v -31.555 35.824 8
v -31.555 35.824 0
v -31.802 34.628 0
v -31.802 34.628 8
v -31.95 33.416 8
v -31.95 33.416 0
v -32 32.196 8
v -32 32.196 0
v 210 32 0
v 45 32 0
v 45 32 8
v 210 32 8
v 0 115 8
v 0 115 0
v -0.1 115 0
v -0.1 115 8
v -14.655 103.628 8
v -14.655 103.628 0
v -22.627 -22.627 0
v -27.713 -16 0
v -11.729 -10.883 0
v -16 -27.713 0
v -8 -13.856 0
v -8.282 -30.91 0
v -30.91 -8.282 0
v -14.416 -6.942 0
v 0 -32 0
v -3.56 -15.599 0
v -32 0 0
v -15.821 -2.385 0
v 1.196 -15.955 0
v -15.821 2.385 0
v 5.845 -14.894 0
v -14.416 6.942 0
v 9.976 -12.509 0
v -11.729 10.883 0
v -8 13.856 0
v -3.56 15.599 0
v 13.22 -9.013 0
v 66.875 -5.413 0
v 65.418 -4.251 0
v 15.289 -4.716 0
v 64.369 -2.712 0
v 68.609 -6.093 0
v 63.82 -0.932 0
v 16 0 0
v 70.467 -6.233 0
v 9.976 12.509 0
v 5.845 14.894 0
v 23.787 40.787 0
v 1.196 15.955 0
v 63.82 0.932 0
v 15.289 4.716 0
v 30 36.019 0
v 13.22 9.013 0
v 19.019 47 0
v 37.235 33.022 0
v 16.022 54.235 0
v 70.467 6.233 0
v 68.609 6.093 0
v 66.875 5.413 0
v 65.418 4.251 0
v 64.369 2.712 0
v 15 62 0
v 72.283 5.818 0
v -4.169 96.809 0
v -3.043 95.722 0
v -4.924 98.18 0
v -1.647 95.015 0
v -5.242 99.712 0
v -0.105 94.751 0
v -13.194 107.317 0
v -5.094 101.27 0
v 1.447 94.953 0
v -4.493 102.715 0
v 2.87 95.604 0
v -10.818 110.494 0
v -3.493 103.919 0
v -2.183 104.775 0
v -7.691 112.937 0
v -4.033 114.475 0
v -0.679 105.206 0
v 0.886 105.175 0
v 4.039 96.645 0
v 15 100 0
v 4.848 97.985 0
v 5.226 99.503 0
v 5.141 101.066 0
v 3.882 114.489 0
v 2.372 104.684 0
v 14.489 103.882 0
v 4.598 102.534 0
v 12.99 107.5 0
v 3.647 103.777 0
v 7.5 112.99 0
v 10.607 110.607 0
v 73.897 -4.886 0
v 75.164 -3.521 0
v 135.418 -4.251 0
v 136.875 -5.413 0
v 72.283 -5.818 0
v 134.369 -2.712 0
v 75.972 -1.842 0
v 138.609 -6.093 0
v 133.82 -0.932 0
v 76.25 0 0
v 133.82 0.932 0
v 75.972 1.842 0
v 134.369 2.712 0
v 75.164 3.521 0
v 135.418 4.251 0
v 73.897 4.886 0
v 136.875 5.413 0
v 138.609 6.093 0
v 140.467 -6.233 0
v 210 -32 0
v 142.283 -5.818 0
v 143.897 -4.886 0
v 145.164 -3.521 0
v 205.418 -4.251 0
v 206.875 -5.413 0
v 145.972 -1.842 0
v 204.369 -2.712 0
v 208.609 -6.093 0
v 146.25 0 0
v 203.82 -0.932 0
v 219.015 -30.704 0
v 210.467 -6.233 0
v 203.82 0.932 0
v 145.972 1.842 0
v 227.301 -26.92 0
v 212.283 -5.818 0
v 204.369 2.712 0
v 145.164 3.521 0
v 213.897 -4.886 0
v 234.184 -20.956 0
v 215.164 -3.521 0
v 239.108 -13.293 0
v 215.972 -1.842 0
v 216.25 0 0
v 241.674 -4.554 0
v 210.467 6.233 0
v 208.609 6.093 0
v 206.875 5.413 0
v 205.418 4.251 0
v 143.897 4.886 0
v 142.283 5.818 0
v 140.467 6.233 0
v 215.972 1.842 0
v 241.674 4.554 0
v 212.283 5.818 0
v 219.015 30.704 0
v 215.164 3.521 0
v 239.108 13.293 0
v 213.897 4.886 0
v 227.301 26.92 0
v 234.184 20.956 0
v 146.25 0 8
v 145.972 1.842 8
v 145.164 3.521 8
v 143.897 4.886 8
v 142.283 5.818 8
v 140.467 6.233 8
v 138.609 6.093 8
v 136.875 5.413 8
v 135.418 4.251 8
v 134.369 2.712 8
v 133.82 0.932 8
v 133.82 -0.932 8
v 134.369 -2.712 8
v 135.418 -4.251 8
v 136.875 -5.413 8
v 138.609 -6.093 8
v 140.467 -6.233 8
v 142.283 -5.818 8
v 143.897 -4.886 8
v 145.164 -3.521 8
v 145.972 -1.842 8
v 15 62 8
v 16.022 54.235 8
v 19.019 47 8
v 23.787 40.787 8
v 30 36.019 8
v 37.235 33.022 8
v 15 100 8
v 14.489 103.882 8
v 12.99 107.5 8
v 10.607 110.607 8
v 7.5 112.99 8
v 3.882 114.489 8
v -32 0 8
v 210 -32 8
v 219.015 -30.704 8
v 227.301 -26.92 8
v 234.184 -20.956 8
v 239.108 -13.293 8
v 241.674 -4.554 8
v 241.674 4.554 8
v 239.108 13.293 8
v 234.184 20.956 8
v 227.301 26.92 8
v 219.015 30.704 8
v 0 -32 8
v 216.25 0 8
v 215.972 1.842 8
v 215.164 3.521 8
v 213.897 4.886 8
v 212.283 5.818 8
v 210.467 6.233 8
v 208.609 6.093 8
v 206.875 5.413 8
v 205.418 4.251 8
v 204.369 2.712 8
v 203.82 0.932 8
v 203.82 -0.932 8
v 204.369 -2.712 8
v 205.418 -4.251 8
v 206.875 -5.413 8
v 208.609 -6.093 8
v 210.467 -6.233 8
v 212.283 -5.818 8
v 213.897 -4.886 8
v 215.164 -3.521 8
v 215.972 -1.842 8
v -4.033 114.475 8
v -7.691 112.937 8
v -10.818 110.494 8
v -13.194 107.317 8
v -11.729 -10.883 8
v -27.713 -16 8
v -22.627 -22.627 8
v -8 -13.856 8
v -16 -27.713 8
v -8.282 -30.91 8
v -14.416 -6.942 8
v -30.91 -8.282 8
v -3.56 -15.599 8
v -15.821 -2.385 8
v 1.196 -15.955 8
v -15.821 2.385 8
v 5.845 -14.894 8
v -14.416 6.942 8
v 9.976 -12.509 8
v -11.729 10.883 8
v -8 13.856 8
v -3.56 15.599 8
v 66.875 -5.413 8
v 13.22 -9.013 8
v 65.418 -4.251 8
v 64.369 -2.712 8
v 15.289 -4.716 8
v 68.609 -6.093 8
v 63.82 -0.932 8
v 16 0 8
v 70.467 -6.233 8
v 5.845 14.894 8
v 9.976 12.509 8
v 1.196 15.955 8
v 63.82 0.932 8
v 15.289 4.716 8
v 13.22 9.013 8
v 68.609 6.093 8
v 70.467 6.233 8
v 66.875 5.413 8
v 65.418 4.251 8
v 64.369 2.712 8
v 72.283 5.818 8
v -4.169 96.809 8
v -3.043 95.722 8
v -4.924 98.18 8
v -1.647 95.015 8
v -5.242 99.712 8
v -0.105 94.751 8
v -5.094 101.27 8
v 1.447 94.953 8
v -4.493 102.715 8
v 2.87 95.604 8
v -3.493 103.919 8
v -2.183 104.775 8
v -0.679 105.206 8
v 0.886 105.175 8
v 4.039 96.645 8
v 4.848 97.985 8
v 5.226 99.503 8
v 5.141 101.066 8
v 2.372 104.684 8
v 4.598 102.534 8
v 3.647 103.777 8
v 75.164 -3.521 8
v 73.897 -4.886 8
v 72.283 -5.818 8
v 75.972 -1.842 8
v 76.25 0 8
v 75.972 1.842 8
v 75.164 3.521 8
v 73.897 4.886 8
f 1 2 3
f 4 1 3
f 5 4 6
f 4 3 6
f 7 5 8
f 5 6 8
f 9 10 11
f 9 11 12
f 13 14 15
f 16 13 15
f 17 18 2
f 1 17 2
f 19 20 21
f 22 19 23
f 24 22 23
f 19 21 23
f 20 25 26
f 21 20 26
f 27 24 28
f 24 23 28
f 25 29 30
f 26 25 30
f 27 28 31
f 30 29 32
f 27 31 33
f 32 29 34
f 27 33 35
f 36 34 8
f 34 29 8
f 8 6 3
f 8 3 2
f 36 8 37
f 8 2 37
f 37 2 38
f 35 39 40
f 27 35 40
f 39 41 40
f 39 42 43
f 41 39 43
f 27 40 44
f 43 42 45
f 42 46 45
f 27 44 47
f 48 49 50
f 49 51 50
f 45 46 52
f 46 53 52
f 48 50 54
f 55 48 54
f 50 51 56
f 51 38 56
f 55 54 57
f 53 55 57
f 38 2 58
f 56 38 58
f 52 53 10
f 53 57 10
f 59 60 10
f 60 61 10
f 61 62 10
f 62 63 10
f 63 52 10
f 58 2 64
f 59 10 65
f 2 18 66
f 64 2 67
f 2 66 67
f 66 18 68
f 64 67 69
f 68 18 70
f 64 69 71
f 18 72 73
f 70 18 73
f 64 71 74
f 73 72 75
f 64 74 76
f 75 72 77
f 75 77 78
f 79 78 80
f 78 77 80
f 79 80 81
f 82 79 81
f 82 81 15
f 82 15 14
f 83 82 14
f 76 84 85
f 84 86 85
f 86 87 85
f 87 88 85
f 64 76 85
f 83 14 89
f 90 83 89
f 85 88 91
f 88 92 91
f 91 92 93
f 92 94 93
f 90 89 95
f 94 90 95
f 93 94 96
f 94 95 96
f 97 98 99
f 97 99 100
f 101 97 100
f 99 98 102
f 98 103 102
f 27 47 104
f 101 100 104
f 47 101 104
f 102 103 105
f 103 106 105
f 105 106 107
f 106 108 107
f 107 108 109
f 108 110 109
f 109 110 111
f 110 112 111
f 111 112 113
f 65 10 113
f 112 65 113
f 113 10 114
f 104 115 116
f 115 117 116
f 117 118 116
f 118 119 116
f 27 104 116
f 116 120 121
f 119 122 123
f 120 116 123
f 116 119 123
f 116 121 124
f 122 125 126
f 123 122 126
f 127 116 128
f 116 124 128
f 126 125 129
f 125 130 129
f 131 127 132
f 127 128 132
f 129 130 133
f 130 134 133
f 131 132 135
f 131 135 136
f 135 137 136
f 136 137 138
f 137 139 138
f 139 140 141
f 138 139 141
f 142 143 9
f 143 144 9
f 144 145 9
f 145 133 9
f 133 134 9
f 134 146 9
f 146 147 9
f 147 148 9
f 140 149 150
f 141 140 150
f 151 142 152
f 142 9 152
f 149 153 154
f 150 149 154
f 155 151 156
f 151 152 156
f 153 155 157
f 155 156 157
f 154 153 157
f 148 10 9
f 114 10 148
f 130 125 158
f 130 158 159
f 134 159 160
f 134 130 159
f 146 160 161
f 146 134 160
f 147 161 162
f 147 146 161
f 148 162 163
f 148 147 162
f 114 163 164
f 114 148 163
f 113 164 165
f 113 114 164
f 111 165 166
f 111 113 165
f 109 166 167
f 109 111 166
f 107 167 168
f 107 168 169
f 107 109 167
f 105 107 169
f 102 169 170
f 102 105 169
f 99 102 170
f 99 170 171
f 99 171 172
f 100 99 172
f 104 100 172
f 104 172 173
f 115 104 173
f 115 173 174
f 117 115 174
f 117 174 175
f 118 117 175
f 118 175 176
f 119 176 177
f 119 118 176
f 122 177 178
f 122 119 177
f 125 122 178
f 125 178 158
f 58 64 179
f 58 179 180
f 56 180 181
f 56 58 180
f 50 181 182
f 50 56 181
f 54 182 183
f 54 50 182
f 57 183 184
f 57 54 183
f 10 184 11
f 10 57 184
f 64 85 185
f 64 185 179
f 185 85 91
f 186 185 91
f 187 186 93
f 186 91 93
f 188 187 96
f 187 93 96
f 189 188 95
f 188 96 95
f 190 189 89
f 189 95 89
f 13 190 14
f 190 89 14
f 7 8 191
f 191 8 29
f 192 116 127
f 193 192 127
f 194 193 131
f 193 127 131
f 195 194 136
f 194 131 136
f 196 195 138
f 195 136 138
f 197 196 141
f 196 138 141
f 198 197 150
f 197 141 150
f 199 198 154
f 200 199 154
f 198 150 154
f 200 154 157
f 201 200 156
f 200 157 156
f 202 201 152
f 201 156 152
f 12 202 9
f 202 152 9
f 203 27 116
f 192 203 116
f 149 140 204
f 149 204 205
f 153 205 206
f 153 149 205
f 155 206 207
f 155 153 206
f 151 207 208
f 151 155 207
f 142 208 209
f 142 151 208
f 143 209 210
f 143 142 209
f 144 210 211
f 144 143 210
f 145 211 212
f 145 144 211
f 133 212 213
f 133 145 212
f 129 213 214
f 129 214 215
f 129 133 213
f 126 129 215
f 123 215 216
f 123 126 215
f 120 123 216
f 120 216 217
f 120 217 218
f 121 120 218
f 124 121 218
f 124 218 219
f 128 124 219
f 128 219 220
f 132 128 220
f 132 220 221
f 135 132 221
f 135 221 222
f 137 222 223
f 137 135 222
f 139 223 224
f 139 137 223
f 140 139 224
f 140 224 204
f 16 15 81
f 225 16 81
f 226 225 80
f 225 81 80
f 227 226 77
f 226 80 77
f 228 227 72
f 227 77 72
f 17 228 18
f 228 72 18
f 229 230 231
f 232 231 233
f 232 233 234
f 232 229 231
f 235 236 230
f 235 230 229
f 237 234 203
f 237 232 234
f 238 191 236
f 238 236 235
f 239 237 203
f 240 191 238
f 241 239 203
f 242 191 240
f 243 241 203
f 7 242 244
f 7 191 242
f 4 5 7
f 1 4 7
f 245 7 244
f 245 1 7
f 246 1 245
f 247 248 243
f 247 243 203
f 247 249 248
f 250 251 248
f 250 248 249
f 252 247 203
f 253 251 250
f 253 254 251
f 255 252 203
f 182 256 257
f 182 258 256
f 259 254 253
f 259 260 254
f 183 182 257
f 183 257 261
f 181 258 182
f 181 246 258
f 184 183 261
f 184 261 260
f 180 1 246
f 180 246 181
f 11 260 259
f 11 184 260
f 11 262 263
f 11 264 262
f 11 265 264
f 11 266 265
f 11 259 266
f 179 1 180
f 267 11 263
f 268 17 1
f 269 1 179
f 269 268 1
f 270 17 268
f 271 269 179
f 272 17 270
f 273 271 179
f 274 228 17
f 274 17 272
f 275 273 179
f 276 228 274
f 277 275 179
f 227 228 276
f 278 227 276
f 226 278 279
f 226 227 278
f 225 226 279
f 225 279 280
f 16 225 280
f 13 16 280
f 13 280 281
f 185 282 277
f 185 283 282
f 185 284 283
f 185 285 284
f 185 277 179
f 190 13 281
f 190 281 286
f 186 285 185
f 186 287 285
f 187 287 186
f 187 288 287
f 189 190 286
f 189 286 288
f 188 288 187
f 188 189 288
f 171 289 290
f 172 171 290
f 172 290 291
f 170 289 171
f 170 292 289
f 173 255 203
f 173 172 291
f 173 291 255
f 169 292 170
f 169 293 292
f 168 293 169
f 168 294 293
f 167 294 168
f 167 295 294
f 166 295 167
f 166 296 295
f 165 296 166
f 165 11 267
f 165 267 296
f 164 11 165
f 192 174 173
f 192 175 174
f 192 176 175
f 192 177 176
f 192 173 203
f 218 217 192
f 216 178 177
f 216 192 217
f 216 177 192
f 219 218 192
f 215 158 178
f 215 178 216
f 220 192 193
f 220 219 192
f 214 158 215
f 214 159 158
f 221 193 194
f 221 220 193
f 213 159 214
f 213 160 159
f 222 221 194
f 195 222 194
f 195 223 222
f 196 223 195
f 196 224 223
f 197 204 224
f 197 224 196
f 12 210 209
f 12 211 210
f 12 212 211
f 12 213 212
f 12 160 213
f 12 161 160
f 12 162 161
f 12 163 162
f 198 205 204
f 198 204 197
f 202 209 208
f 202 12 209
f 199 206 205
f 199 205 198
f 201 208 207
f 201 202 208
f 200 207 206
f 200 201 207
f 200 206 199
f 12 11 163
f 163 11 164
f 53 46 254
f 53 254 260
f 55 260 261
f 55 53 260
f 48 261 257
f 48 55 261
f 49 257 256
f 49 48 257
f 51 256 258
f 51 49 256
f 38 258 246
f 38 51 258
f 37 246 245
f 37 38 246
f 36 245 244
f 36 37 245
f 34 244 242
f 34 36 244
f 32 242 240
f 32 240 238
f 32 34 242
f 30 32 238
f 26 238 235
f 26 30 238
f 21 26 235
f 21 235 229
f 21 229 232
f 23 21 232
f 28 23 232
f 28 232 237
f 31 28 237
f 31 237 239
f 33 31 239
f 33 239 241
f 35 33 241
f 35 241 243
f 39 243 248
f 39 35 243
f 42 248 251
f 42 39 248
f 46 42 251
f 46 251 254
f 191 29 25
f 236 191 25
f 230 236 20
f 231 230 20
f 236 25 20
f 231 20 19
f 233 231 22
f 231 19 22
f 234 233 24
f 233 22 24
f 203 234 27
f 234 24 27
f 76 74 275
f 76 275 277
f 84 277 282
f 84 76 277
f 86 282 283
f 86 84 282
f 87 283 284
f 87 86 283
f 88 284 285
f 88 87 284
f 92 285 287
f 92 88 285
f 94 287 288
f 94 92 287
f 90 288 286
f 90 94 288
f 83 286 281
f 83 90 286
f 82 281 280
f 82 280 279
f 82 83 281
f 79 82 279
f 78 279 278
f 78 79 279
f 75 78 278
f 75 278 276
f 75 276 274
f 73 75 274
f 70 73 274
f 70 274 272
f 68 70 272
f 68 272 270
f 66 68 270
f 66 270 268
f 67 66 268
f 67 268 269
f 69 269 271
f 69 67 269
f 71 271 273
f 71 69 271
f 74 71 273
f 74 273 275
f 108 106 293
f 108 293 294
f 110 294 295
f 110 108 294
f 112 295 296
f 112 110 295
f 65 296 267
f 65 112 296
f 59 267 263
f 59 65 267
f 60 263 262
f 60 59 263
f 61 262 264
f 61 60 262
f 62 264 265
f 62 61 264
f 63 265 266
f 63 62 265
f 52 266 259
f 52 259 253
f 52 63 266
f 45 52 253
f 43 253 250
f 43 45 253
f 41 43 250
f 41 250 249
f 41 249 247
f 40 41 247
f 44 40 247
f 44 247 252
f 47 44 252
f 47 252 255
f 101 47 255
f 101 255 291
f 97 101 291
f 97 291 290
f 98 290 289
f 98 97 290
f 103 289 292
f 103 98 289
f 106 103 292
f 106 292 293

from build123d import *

# Parameters (mm, degrees)
SKETCH_R   = 16
SKETCH_R_2 = 6.25
PAD_DEPTH  = 8


with BuildPart() as part:
    # Sketch → Pad (new body)
    with BuildSketch(Plane.XY):
        with BuildLine():
            ThreePointArc((-32, 0), (-22.627417, -22.627417), (0, -32))
            Line((0, -32), (210, -32))
            ThreePointArc((210, -32), (242, 0), (210, 32))
            Line((45, 32), (210, 32))
            ThreePointArc((15, 62), (23.786797, 40.786797), (45, 32))
            Line((15, 100), (15, 62))
            ThreePointArc((15, 100), (10.606602, 110.606602), (0, 115))
            Line((0, 115), (-0.1, 115))
            ThreePointArc((-0.1, 115), (-9.335368, 111.819813), (-14.65471, 103.62773))
            Line((-14.65471, 103.62773), (-31.55471, 35.82373))
            ThreePointArc((-31.55471, 35.82373), (-31.888261, 34.023479), (-32, 32.196))
            Line((-32, 32.196), (-32, 0))
        make_face()
        Circle(SKETCH_R, mode=Mode.SUBTRACT)
        with Locations((70, 0)):
            Circle(SKETCH_R_2, mode=Mode.SUBTRACT)
        with Locations((140, 0)):
            Circle(SKETCH_R_2, mode=Mode.SUBTRACT)
        with Locations((210, 0)):
            Circle(SKETCH_R_2, mode=Mode.SUBTRACT)
        with BuildLine():
            ThreePointArc((-1.447096, 105.046624), (-5.046624, 98.552904), (1.447096, 94.953376))
            ThreePointArc((1.447096, 94.953376), (5.046624, 101.447096), (-1.447096, 105.046624))
        make_face(mode=Mode.SUBTRACT)
    extrude(amount=PAD_DEPTH)


solid = part.part
